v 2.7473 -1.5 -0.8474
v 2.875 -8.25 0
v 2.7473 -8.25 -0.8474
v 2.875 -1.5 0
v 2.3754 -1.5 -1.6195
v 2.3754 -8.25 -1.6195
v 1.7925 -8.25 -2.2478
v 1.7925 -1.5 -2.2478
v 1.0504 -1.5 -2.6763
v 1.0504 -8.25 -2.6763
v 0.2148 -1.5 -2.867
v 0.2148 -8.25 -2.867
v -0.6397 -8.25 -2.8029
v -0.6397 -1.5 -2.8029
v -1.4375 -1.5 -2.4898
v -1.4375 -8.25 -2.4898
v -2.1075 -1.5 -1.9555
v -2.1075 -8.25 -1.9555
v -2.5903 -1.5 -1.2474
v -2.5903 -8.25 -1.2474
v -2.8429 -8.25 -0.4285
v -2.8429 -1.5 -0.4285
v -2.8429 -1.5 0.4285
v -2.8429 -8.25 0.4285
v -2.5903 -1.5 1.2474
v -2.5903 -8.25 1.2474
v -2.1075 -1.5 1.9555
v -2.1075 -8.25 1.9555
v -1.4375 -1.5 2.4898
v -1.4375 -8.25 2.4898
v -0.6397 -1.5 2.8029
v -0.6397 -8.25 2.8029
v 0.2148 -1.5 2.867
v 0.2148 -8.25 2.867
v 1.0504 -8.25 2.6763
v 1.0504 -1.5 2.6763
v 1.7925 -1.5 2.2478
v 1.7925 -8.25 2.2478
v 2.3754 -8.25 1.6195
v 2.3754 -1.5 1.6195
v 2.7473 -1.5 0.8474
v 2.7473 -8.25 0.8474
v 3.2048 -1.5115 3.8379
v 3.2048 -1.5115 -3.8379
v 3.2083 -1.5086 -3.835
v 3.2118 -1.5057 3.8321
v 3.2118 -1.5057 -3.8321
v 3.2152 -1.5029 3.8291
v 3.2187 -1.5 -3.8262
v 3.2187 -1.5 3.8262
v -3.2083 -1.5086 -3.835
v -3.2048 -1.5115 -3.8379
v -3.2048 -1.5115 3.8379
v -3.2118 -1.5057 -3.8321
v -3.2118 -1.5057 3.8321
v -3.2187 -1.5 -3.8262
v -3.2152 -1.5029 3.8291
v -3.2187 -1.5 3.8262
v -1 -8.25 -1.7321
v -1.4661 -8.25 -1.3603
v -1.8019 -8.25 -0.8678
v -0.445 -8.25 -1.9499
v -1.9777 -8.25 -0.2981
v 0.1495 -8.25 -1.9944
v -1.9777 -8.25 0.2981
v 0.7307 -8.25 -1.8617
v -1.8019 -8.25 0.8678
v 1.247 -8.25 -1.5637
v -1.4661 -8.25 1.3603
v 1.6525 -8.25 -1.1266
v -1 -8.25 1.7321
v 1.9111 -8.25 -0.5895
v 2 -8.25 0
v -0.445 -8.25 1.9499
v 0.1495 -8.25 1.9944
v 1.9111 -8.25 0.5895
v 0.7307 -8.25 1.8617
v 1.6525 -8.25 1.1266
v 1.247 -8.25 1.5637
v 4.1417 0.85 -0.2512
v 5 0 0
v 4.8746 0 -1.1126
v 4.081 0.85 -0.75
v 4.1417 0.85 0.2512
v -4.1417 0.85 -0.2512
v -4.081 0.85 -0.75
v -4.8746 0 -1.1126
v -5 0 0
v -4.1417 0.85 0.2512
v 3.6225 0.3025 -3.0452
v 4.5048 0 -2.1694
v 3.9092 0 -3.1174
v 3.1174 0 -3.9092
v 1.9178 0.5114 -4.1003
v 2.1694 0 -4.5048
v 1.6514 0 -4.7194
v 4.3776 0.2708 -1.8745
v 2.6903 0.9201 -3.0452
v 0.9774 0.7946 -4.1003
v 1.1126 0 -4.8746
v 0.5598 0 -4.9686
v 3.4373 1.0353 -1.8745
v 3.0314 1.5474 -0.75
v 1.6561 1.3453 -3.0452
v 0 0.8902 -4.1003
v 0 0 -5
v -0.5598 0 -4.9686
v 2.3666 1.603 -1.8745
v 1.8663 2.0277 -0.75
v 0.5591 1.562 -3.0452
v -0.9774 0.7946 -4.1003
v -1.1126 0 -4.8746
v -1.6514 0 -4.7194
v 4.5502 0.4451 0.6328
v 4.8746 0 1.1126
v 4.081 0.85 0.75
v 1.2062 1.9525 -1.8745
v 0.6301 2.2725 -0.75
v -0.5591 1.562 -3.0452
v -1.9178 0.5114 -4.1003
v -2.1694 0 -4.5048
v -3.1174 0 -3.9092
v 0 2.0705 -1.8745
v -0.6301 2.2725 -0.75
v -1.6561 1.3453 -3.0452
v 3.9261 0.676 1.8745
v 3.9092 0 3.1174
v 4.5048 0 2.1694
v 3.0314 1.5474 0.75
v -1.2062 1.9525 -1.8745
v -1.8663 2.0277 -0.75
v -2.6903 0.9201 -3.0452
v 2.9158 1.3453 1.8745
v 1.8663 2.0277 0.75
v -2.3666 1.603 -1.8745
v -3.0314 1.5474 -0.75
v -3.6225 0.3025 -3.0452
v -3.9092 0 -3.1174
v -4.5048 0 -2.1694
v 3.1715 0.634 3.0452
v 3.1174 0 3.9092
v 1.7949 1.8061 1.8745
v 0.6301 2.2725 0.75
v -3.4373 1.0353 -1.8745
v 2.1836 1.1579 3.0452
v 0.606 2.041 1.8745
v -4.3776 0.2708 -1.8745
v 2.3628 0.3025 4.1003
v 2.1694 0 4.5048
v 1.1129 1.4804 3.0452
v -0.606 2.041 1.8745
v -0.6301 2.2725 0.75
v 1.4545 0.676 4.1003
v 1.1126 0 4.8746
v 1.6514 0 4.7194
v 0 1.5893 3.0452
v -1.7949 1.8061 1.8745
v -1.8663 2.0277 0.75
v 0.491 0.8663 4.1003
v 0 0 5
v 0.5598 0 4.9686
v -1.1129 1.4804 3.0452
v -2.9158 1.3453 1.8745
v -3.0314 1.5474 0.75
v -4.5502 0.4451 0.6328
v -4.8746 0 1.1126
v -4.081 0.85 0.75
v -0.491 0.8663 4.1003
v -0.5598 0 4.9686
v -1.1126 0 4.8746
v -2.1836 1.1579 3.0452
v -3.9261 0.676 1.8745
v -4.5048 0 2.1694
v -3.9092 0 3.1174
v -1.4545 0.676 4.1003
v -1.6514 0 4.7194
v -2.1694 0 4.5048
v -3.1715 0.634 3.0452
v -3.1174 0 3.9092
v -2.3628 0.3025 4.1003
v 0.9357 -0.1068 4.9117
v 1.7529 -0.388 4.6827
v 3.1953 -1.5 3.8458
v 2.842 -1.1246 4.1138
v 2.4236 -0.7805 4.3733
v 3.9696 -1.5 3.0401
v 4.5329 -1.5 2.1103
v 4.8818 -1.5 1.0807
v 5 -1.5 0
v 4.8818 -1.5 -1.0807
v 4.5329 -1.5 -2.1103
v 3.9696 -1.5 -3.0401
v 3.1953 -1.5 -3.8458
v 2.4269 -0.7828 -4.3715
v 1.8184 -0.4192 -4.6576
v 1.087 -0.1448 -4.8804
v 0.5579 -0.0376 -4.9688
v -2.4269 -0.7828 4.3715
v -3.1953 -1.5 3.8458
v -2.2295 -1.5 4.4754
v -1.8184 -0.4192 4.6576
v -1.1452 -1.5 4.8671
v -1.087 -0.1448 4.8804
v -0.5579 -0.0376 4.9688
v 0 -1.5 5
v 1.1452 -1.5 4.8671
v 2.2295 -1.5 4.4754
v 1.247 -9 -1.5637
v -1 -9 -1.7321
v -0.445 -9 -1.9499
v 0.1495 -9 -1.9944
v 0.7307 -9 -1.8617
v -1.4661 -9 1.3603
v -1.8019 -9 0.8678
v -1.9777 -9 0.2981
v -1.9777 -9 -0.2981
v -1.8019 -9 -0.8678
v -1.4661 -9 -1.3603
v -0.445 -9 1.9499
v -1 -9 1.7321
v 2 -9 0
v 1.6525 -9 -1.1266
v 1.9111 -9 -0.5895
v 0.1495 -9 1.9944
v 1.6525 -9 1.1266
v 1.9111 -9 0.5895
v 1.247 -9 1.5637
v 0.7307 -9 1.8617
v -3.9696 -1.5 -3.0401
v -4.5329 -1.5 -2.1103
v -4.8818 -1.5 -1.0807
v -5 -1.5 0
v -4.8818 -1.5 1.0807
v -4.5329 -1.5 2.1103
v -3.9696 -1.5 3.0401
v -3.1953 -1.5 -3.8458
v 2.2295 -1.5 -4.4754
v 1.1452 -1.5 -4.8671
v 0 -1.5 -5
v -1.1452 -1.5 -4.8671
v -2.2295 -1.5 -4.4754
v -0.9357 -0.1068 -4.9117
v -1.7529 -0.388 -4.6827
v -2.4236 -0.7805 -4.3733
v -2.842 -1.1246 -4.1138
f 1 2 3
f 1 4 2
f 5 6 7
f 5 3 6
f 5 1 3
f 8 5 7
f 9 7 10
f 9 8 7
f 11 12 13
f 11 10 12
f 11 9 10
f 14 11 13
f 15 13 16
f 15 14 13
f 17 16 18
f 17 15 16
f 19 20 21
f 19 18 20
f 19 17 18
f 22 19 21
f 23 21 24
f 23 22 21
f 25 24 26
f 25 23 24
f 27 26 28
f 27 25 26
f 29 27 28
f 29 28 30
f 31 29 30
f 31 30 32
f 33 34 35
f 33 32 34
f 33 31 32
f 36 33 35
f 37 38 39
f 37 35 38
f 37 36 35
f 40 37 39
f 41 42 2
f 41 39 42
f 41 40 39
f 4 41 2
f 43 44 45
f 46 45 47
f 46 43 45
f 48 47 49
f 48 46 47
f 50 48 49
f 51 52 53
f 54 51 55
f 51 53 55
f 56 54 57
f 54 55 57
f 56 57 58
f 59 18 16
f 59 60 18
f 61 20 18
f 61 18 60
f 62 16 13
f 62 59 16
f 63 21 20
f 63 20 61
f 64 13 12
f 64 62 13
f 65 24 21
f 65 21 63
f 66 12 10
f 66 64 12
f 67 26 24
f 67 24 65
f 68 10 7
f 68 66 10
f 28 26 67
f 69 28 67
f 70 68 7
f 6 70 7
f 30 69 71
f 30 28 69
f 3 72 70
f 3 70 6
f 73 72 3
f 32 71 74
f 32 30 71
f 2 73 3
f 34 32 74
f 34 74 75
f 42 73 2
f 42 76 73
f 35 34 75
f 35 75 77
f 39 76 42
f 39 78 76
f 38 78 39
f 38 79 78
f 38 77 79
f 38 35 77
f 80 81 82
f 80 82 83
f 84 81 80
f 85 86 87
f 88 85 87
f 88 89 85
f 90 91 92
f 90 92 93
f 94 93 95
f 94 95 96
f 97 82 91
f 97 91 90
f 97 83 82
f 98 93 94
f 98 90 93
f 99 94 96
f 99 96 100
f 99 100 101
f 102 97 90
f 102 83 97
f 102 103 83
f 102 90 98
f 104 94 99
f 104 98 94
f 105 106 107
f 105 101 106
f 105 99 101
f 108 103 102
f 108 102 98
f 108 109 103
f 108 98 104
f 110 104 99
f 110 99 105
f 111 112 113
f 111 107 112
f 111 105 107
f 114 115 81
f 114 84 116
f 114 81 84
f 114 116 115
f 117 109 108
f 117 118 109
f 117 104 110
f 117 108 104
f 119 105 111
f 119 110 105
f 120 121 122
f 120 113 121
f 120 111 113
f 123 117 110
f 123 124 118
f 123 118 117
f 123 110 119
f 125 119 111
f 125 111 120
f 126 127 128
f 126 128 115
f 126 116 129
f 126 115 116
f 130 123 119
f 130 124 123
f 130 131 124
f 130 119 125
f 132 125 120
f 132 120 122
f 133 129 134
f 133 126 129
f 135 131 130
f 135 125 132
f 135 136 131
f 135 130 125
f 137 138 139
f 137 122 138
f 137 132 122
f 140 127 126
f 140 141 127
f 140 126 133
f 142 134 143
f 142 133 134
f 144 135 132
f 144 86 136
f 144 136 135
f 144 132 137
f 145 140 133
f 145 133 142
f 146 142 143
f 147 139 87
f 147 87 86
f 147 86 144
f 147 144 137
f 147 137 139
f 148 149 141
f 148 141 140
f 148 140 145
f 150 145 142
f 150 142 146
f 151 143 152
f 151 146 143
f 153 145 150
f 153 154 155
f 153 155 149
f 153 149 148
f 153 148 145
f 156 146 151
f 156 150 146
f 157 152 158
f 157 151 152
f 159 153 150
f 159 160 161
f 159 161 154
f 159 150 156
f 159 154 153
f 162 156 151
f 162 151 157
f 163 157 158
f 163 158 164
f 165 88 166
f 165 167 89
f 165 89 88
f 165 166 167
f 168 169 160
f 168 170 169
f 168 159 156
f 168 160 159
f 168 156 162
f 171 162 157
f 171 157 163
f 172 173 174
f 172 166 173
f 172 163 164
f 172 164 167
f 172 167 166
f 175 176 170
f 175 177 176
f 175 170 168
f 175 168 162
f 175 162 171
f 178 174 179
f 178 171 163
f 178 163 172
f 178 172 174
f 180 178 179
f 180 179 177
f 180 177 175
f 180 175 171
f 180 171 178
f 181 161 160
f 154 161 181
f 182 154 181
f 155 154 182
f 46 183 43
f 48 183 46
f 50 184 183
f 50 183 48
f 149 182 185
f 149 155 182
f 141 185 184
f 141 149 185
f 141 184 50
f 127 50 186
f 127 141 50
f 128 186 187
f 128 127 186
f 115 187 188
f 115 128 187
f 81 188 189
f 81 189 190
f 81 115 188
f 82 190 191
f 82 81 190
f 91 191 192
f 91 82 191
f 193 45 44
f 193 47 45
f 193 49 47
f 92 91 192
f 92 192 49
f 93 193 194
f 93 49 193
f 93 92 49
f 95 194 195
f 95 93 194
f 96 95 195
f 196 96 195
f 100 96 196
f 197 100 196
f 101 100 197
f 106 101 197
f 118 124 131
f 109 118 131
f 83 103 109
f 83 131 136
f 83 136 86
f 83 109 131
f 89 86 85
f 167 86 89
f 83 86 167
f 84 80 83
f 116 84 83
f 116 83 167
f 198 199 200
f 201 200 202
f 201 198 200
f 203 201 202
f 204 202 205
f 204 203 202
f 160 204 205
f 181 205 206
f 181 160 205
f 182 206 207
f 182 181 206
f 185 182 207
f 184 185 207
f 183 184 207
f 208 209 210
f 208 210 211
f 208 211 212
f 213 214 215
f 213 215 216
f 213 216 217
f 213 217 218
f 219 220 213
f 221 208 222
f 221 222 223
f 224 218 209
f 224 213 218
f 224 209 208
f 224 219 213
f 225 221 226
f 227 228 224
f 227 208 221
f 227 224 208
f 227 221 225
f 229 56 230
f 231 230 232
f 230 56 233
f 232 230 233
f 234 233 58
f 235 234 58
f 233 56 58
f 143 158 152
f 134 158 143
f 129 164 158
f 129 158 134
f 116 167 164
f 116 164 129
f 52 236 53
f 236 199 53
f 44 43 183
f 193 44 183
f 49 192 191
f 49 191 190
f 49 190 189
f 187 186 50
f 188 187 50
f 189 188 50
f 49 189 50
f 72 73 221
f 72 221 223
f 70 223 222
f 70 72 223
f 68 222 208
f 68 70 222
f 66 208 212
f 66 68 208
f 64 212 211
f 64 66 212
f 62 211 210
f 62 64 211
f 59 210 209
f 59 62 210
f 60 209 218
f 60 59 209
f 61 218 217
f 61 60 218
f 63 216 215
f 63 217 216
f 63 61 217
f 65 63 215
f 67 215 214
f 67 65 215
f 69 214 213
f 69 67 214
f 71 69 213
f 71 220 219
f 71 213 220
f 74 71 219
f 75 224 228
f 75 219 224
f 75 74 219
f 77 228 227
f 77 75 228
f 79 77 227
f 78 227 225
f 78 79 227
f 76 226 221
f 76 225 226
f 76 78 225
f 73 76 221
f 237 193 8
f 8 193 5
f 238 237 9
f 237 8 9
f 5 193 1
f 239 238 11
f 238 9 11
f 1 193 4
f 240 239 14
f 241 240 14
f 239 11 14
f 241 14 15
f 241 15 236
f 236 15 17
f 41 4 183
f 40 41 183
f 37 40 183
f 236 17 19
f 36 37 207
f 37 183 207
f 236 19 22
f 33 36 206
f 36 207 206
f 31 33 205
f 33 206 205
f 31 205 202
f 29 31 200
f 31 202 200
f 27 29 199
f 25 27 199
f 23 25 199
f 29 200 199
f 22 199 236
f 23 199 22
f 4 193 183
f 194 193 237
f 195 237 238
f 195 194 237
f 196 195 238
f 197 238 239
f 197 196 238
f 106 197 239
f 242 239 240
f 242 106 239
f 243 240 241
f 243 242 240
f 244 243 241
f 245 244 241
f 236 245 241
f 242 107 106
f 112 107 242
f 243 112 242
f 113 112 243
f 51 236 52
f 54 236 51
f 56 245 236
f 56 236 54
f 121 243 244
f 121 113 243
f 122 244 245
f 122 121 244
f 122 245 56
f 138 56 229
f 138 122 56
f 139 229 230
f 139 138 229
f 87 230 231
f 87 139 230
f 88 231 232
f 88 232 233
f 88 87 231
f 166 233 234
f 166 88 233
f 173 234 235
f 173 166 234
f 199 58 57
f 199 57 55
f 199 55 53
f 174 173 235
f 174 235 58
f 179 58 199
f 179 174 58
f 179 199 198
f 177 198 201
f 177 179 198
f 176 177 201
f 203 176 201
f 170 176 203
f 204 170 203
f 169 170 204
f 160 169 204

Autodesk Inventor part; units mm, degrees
ref_plane "YZ Plane" through (0, 0, 0) normal (1, 0, 0) x (0, 1, 0)
ref_plane "XZ Plane" through (0, 0, 0) normal (0, 1, 0) x (-1, 0, 0)
ref_plane "XY Plane" through (0, 0, 0) normal (0, 0, 1) x (1, 0, 0)
sketch "Sketch1" plane through (0, 0, 0) normal (0, 1, 0) x (-1, 0, 0)
  circle A0 centre (0, 0) radius 5
  dimension "d0" = 10
extrude "Extrusion1" add sketch "Sketch1" against normal blind 1.5
sketch "Sketch2" plane through (0, -1.5, 0) normal (0, -1, 0) x (1, 0, 0)
  circle A0 centre (0, 0) radius 2.875
  dimension "d3" = 5.75
extrude "Extrusion2" add sketch "Sketch2" along normal blind 6.75
sketch "Sketch3" plane through (0, -8.25, 0) normal (0, -1, 0) x (1, 0, 0)
  circle A0 centre (0, 0) radius 2
  dimension "d6" = 4
extrude "Extrusion3" add sketch "Sketch3" along normal blind 0.75
sketch "Sketch4" plane through (0, 0, 0) normal (1, 0, 0) x (0, 1, 0)
  line L0 (0, -5) -> (0, 5) projected
  arc A0 (0, -5) -> (0, 5) centre (-4.1533, 0) ccw
  line L1 (0, 5) -> (-0.75, 5)
  line L2 (0, 5) -> (-1.5, 5) projected
  line L3 (0, -5) -> (-1.5, -5) projected
  line L4 (-0.75, -5) -> (0, -5)
  line L5 (-4.1533, 5) -> (-4.1533, -5) construction
  point P0 (0, 0)
  dimension "d9" = 6.5
revolve "Revolution1" add sketch "Sketch4" angle 101 mid plane about axis through (0, -4.1533, 5) along (0, 0, -1)
sketch "Sketch5" plane through (0, 0, 0) normal (0, 1, 0) x (-1, 0, 0)
  circle A0 centre (0, 0) radius 5
  circle A1 centre (0, 0) radius 8.973
extrude "Extrusion4" cut sketch "Sketch5" against normal mid plane 100
sketch "Sketch6" plane through (0, 0, 0) normal (1, 0, 0) x (0, 1, 0)
  line L0 (-8.25, 2.875) -> (-8.25, -2.875) projected
  line L1 (0.85, 0.75) -> (5.85, 0.75)
  line L2 (5.85, 0.75) -> (5.85, -0.75)
  line L3 (5.85, -0.75) -> (0.85, -0.75)
  line L4 (0.85, -0.75) -> (0.85, 0.75)
  point P0 (0, 0)
  dimension "d14" = 1.5
  dimension "d15" = 5
extrude "Extrusion5" cut sketch "Sketch6" against normal mid plane 10
properties part number "1 Prisionero" material "Steel"
